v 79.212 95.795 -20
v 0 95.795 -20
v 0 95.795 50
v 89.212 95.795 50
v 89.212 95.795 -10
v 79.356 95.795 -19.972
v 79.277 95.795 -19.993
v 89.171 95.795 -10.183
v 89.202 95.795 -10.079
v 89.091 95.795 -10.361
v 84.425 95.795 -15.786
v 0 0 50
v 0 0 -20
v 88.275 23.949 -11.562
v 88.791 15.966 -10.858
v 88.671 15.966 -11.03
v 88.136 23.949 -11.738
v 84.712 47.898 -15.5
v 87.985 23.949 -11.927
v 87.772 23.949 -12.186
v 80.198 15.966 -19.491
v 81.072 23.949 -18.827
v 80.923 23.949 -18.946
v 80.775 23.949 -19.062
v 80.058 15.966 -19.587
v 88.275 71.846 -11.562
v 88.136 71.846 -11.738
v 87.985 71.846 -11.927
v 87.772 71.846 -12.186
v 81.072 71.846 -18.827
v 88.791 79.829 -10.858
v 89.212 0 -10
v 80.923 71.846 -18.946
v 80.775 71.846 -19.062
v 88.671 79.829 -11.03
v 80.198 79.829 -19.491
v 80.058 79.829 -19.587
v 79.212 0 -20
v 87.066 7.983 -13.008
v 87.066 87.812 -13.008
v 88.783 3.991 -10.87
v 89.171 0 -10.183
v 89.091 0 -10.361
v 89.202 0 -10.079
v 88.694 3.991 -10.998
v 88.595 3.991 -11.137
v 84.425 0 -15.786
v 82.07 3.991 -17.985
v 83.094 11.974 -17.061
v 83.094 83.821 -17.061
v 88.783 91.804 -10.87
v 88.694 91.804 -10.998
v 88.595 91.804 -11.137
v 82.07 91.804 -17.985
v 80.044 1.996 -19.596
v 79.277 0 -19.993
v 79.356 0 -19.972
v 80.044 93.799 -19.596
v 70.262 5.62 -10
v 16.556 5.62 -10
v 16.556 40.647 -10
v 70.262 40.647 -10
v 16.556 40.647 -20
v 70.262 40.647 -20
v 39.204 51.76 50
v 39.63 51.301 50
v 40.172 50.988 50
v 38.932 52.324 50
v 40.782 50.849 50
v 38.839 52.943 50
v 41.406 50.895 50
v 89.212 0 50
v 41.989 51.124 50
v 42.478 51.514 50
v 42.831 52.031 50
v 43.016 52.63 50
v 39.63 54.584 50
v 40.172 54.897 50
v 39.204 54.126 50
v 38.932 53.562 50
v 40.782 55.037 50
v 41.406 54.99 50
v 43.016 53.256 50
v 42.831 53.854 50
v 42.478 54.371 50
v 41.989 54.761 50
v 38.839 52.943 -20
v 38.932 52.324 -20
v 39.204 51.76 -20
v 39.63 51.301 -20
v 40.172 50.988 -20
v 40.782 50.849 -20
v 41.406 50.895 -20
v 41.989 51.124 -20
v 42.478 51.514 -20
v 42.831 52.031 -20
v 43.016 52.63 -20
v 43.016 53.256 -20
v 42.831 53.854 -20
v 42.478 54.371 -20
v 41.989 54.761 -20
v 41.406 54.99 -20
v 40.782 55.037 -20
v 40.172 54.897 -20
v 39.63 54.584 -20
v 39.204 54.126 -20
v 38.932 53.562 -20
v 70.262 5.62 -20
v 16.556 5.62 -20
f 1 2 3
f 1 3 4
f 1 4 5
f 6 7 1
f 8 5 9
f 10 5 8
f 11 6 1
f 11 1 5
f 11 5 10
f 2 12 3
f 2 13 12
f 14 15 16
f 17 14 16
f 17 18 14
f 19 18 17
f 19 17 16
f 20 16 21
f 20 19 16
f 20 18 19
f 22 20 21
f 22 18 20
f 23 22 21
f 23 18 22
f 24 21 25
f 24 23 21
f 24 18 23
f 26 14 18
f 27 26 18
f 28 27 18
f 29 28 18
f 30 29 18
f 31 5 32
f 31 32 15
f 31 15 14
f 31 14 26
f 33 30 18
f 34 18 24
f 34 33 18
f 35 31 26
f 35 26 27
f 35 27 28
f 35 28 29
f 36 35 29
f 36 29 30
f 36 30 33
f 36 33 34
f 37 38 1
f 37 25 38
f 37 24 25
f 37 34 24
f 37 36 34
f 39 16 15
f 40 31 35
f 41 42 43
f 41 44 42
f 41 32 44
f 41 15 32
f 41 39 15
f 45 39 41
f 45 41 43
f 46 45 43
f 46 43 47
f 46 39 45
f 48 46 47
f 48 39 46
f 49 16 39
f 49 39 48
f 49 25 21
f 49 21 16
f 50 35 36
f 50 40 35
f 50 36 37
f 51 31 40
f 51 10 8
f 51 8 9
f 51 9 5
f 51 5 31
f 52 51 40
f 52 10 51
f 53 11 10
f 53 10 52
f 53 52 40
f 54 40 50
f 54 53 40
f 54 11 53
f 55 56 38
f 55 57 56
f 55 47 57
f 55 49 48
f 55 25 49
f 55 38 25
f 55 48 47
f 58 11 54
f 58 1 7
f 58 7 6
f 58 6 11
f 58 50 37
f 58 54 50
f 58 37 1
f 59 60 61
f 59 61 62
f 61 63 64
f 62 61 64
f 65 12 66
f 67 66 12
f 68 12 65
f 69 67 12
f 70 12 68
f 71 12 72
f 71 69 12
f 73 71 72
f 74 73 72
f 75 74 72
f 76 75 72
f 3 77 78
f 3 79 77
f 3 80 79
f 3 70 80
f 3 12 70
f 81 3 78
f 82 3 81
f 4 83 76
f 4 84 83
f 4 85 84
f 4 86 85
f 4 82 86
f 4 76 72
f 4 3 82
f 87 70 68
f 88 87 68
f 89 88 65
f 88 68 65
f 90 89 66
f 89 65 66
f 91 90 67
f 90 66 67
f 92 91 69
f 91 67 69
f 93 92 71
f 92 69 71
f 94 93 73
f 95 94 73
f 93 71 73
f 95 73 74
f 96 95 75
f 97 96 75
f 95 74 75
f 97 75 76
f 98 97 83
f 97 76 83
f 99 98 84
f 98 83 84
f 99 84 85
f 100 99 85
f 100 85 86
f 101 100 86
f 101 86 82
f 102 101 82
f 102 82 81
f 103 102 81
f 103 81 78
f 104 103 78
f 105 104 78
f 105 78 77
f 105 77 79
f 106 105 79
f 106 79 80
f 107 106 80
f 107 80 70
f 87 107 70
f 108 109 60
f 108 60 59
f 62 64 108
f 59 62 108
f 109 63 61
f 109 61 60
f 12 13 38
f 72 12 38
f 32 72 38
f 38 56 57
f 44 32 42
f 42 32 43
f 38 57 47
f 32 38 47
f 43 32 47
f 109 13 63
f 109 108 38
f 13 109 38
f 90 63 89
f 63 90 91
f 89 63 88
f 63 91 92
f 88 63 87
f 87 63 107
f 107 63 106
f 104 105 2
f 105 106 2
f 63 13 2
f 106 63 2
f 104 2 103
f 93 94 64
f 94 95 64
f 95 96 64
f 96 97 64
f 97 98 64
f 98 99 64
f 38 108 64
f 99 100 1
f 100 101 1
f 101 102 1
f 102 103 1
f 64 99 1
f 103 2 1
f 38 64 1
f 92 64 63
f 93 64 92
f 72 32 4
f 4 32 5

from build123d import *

# Parameters (mm, degrees)
F0_W          = 89.2122089863
F0_H          = 95.7951173186
F1_DEPTH      = 20
F1_DEPTH_BACK = 50
F2_T1_DEPTH   = 145.7951173186
F4_D          = 4.2
F5_W          = 53.7064000964
F5_H          = 35.0269903429
F6_DEPTH      = 10


# Not quite as in the source:
# - a fillet or chamfer that OpenCascade refuses, or shapes differently, is made with other operations: its cross-section is extruded or revolved along the edge and cut away or added


with BuildPart() as f1:
    # F0 (on Top) → F1 (new body, two sides)
    with BuildSketch(Plane.XY) as f1_sk:
        with Locations((44.6061044931, 47.8975586593)):
            Rectangle(F0_W, F0_H)
    extrude(amount=-F1_DEPTH)
    extrude(f1_sk.sketch, amount=F1_DEPTH_BACK)

    # F2: fillet of radius 10 on 1 edges, made by hand

    # F2_s2 → F2_t1 (cut)
    with BuildSketch(Plane.XZ.offset(-120.7951173186)):
        with BuildLine():
            add(Edge.make_bspline(
                [(89.2122089863, -10), (89.2122089863, -20), (79.2122089863, -20)],
                knots=[0, 0, 0, 1, 1, 1], degree=2, weights=[1, 0.1111111111, 1]))
            Line((79.2122089863, -20), (89.2122089863, -20))
            Line((89.2122089863, -20), (89.2122089863, -10))
        make_face()
    extrude(amount=F2_T1_DEPTH, mode=Mode.SUBTRACT)

    # F4 (through all)
    with Locations(Plane(origin=(0, 0, -20), x_dir=(1, 0, 0), z_dir=(0, 0, -1))):
        with Locations((40.9390032291, -52.9426522553)):
            Hole(F4_D / 2)

    # F5 (on face) → F6 (cut)
    with BuildSketch(Plane(origin=(0, 0, -20), x_dir=(1, 0, 0), z_dir=(0, 0, -1))):
        with Locations((43.4090383351, -23.1333931442)):
            Rectangle(F5_W, F5_H)
    extrude(amount=-F6_DEPTH, mode=Mode.SUBTRACT)


solid = f1.part
